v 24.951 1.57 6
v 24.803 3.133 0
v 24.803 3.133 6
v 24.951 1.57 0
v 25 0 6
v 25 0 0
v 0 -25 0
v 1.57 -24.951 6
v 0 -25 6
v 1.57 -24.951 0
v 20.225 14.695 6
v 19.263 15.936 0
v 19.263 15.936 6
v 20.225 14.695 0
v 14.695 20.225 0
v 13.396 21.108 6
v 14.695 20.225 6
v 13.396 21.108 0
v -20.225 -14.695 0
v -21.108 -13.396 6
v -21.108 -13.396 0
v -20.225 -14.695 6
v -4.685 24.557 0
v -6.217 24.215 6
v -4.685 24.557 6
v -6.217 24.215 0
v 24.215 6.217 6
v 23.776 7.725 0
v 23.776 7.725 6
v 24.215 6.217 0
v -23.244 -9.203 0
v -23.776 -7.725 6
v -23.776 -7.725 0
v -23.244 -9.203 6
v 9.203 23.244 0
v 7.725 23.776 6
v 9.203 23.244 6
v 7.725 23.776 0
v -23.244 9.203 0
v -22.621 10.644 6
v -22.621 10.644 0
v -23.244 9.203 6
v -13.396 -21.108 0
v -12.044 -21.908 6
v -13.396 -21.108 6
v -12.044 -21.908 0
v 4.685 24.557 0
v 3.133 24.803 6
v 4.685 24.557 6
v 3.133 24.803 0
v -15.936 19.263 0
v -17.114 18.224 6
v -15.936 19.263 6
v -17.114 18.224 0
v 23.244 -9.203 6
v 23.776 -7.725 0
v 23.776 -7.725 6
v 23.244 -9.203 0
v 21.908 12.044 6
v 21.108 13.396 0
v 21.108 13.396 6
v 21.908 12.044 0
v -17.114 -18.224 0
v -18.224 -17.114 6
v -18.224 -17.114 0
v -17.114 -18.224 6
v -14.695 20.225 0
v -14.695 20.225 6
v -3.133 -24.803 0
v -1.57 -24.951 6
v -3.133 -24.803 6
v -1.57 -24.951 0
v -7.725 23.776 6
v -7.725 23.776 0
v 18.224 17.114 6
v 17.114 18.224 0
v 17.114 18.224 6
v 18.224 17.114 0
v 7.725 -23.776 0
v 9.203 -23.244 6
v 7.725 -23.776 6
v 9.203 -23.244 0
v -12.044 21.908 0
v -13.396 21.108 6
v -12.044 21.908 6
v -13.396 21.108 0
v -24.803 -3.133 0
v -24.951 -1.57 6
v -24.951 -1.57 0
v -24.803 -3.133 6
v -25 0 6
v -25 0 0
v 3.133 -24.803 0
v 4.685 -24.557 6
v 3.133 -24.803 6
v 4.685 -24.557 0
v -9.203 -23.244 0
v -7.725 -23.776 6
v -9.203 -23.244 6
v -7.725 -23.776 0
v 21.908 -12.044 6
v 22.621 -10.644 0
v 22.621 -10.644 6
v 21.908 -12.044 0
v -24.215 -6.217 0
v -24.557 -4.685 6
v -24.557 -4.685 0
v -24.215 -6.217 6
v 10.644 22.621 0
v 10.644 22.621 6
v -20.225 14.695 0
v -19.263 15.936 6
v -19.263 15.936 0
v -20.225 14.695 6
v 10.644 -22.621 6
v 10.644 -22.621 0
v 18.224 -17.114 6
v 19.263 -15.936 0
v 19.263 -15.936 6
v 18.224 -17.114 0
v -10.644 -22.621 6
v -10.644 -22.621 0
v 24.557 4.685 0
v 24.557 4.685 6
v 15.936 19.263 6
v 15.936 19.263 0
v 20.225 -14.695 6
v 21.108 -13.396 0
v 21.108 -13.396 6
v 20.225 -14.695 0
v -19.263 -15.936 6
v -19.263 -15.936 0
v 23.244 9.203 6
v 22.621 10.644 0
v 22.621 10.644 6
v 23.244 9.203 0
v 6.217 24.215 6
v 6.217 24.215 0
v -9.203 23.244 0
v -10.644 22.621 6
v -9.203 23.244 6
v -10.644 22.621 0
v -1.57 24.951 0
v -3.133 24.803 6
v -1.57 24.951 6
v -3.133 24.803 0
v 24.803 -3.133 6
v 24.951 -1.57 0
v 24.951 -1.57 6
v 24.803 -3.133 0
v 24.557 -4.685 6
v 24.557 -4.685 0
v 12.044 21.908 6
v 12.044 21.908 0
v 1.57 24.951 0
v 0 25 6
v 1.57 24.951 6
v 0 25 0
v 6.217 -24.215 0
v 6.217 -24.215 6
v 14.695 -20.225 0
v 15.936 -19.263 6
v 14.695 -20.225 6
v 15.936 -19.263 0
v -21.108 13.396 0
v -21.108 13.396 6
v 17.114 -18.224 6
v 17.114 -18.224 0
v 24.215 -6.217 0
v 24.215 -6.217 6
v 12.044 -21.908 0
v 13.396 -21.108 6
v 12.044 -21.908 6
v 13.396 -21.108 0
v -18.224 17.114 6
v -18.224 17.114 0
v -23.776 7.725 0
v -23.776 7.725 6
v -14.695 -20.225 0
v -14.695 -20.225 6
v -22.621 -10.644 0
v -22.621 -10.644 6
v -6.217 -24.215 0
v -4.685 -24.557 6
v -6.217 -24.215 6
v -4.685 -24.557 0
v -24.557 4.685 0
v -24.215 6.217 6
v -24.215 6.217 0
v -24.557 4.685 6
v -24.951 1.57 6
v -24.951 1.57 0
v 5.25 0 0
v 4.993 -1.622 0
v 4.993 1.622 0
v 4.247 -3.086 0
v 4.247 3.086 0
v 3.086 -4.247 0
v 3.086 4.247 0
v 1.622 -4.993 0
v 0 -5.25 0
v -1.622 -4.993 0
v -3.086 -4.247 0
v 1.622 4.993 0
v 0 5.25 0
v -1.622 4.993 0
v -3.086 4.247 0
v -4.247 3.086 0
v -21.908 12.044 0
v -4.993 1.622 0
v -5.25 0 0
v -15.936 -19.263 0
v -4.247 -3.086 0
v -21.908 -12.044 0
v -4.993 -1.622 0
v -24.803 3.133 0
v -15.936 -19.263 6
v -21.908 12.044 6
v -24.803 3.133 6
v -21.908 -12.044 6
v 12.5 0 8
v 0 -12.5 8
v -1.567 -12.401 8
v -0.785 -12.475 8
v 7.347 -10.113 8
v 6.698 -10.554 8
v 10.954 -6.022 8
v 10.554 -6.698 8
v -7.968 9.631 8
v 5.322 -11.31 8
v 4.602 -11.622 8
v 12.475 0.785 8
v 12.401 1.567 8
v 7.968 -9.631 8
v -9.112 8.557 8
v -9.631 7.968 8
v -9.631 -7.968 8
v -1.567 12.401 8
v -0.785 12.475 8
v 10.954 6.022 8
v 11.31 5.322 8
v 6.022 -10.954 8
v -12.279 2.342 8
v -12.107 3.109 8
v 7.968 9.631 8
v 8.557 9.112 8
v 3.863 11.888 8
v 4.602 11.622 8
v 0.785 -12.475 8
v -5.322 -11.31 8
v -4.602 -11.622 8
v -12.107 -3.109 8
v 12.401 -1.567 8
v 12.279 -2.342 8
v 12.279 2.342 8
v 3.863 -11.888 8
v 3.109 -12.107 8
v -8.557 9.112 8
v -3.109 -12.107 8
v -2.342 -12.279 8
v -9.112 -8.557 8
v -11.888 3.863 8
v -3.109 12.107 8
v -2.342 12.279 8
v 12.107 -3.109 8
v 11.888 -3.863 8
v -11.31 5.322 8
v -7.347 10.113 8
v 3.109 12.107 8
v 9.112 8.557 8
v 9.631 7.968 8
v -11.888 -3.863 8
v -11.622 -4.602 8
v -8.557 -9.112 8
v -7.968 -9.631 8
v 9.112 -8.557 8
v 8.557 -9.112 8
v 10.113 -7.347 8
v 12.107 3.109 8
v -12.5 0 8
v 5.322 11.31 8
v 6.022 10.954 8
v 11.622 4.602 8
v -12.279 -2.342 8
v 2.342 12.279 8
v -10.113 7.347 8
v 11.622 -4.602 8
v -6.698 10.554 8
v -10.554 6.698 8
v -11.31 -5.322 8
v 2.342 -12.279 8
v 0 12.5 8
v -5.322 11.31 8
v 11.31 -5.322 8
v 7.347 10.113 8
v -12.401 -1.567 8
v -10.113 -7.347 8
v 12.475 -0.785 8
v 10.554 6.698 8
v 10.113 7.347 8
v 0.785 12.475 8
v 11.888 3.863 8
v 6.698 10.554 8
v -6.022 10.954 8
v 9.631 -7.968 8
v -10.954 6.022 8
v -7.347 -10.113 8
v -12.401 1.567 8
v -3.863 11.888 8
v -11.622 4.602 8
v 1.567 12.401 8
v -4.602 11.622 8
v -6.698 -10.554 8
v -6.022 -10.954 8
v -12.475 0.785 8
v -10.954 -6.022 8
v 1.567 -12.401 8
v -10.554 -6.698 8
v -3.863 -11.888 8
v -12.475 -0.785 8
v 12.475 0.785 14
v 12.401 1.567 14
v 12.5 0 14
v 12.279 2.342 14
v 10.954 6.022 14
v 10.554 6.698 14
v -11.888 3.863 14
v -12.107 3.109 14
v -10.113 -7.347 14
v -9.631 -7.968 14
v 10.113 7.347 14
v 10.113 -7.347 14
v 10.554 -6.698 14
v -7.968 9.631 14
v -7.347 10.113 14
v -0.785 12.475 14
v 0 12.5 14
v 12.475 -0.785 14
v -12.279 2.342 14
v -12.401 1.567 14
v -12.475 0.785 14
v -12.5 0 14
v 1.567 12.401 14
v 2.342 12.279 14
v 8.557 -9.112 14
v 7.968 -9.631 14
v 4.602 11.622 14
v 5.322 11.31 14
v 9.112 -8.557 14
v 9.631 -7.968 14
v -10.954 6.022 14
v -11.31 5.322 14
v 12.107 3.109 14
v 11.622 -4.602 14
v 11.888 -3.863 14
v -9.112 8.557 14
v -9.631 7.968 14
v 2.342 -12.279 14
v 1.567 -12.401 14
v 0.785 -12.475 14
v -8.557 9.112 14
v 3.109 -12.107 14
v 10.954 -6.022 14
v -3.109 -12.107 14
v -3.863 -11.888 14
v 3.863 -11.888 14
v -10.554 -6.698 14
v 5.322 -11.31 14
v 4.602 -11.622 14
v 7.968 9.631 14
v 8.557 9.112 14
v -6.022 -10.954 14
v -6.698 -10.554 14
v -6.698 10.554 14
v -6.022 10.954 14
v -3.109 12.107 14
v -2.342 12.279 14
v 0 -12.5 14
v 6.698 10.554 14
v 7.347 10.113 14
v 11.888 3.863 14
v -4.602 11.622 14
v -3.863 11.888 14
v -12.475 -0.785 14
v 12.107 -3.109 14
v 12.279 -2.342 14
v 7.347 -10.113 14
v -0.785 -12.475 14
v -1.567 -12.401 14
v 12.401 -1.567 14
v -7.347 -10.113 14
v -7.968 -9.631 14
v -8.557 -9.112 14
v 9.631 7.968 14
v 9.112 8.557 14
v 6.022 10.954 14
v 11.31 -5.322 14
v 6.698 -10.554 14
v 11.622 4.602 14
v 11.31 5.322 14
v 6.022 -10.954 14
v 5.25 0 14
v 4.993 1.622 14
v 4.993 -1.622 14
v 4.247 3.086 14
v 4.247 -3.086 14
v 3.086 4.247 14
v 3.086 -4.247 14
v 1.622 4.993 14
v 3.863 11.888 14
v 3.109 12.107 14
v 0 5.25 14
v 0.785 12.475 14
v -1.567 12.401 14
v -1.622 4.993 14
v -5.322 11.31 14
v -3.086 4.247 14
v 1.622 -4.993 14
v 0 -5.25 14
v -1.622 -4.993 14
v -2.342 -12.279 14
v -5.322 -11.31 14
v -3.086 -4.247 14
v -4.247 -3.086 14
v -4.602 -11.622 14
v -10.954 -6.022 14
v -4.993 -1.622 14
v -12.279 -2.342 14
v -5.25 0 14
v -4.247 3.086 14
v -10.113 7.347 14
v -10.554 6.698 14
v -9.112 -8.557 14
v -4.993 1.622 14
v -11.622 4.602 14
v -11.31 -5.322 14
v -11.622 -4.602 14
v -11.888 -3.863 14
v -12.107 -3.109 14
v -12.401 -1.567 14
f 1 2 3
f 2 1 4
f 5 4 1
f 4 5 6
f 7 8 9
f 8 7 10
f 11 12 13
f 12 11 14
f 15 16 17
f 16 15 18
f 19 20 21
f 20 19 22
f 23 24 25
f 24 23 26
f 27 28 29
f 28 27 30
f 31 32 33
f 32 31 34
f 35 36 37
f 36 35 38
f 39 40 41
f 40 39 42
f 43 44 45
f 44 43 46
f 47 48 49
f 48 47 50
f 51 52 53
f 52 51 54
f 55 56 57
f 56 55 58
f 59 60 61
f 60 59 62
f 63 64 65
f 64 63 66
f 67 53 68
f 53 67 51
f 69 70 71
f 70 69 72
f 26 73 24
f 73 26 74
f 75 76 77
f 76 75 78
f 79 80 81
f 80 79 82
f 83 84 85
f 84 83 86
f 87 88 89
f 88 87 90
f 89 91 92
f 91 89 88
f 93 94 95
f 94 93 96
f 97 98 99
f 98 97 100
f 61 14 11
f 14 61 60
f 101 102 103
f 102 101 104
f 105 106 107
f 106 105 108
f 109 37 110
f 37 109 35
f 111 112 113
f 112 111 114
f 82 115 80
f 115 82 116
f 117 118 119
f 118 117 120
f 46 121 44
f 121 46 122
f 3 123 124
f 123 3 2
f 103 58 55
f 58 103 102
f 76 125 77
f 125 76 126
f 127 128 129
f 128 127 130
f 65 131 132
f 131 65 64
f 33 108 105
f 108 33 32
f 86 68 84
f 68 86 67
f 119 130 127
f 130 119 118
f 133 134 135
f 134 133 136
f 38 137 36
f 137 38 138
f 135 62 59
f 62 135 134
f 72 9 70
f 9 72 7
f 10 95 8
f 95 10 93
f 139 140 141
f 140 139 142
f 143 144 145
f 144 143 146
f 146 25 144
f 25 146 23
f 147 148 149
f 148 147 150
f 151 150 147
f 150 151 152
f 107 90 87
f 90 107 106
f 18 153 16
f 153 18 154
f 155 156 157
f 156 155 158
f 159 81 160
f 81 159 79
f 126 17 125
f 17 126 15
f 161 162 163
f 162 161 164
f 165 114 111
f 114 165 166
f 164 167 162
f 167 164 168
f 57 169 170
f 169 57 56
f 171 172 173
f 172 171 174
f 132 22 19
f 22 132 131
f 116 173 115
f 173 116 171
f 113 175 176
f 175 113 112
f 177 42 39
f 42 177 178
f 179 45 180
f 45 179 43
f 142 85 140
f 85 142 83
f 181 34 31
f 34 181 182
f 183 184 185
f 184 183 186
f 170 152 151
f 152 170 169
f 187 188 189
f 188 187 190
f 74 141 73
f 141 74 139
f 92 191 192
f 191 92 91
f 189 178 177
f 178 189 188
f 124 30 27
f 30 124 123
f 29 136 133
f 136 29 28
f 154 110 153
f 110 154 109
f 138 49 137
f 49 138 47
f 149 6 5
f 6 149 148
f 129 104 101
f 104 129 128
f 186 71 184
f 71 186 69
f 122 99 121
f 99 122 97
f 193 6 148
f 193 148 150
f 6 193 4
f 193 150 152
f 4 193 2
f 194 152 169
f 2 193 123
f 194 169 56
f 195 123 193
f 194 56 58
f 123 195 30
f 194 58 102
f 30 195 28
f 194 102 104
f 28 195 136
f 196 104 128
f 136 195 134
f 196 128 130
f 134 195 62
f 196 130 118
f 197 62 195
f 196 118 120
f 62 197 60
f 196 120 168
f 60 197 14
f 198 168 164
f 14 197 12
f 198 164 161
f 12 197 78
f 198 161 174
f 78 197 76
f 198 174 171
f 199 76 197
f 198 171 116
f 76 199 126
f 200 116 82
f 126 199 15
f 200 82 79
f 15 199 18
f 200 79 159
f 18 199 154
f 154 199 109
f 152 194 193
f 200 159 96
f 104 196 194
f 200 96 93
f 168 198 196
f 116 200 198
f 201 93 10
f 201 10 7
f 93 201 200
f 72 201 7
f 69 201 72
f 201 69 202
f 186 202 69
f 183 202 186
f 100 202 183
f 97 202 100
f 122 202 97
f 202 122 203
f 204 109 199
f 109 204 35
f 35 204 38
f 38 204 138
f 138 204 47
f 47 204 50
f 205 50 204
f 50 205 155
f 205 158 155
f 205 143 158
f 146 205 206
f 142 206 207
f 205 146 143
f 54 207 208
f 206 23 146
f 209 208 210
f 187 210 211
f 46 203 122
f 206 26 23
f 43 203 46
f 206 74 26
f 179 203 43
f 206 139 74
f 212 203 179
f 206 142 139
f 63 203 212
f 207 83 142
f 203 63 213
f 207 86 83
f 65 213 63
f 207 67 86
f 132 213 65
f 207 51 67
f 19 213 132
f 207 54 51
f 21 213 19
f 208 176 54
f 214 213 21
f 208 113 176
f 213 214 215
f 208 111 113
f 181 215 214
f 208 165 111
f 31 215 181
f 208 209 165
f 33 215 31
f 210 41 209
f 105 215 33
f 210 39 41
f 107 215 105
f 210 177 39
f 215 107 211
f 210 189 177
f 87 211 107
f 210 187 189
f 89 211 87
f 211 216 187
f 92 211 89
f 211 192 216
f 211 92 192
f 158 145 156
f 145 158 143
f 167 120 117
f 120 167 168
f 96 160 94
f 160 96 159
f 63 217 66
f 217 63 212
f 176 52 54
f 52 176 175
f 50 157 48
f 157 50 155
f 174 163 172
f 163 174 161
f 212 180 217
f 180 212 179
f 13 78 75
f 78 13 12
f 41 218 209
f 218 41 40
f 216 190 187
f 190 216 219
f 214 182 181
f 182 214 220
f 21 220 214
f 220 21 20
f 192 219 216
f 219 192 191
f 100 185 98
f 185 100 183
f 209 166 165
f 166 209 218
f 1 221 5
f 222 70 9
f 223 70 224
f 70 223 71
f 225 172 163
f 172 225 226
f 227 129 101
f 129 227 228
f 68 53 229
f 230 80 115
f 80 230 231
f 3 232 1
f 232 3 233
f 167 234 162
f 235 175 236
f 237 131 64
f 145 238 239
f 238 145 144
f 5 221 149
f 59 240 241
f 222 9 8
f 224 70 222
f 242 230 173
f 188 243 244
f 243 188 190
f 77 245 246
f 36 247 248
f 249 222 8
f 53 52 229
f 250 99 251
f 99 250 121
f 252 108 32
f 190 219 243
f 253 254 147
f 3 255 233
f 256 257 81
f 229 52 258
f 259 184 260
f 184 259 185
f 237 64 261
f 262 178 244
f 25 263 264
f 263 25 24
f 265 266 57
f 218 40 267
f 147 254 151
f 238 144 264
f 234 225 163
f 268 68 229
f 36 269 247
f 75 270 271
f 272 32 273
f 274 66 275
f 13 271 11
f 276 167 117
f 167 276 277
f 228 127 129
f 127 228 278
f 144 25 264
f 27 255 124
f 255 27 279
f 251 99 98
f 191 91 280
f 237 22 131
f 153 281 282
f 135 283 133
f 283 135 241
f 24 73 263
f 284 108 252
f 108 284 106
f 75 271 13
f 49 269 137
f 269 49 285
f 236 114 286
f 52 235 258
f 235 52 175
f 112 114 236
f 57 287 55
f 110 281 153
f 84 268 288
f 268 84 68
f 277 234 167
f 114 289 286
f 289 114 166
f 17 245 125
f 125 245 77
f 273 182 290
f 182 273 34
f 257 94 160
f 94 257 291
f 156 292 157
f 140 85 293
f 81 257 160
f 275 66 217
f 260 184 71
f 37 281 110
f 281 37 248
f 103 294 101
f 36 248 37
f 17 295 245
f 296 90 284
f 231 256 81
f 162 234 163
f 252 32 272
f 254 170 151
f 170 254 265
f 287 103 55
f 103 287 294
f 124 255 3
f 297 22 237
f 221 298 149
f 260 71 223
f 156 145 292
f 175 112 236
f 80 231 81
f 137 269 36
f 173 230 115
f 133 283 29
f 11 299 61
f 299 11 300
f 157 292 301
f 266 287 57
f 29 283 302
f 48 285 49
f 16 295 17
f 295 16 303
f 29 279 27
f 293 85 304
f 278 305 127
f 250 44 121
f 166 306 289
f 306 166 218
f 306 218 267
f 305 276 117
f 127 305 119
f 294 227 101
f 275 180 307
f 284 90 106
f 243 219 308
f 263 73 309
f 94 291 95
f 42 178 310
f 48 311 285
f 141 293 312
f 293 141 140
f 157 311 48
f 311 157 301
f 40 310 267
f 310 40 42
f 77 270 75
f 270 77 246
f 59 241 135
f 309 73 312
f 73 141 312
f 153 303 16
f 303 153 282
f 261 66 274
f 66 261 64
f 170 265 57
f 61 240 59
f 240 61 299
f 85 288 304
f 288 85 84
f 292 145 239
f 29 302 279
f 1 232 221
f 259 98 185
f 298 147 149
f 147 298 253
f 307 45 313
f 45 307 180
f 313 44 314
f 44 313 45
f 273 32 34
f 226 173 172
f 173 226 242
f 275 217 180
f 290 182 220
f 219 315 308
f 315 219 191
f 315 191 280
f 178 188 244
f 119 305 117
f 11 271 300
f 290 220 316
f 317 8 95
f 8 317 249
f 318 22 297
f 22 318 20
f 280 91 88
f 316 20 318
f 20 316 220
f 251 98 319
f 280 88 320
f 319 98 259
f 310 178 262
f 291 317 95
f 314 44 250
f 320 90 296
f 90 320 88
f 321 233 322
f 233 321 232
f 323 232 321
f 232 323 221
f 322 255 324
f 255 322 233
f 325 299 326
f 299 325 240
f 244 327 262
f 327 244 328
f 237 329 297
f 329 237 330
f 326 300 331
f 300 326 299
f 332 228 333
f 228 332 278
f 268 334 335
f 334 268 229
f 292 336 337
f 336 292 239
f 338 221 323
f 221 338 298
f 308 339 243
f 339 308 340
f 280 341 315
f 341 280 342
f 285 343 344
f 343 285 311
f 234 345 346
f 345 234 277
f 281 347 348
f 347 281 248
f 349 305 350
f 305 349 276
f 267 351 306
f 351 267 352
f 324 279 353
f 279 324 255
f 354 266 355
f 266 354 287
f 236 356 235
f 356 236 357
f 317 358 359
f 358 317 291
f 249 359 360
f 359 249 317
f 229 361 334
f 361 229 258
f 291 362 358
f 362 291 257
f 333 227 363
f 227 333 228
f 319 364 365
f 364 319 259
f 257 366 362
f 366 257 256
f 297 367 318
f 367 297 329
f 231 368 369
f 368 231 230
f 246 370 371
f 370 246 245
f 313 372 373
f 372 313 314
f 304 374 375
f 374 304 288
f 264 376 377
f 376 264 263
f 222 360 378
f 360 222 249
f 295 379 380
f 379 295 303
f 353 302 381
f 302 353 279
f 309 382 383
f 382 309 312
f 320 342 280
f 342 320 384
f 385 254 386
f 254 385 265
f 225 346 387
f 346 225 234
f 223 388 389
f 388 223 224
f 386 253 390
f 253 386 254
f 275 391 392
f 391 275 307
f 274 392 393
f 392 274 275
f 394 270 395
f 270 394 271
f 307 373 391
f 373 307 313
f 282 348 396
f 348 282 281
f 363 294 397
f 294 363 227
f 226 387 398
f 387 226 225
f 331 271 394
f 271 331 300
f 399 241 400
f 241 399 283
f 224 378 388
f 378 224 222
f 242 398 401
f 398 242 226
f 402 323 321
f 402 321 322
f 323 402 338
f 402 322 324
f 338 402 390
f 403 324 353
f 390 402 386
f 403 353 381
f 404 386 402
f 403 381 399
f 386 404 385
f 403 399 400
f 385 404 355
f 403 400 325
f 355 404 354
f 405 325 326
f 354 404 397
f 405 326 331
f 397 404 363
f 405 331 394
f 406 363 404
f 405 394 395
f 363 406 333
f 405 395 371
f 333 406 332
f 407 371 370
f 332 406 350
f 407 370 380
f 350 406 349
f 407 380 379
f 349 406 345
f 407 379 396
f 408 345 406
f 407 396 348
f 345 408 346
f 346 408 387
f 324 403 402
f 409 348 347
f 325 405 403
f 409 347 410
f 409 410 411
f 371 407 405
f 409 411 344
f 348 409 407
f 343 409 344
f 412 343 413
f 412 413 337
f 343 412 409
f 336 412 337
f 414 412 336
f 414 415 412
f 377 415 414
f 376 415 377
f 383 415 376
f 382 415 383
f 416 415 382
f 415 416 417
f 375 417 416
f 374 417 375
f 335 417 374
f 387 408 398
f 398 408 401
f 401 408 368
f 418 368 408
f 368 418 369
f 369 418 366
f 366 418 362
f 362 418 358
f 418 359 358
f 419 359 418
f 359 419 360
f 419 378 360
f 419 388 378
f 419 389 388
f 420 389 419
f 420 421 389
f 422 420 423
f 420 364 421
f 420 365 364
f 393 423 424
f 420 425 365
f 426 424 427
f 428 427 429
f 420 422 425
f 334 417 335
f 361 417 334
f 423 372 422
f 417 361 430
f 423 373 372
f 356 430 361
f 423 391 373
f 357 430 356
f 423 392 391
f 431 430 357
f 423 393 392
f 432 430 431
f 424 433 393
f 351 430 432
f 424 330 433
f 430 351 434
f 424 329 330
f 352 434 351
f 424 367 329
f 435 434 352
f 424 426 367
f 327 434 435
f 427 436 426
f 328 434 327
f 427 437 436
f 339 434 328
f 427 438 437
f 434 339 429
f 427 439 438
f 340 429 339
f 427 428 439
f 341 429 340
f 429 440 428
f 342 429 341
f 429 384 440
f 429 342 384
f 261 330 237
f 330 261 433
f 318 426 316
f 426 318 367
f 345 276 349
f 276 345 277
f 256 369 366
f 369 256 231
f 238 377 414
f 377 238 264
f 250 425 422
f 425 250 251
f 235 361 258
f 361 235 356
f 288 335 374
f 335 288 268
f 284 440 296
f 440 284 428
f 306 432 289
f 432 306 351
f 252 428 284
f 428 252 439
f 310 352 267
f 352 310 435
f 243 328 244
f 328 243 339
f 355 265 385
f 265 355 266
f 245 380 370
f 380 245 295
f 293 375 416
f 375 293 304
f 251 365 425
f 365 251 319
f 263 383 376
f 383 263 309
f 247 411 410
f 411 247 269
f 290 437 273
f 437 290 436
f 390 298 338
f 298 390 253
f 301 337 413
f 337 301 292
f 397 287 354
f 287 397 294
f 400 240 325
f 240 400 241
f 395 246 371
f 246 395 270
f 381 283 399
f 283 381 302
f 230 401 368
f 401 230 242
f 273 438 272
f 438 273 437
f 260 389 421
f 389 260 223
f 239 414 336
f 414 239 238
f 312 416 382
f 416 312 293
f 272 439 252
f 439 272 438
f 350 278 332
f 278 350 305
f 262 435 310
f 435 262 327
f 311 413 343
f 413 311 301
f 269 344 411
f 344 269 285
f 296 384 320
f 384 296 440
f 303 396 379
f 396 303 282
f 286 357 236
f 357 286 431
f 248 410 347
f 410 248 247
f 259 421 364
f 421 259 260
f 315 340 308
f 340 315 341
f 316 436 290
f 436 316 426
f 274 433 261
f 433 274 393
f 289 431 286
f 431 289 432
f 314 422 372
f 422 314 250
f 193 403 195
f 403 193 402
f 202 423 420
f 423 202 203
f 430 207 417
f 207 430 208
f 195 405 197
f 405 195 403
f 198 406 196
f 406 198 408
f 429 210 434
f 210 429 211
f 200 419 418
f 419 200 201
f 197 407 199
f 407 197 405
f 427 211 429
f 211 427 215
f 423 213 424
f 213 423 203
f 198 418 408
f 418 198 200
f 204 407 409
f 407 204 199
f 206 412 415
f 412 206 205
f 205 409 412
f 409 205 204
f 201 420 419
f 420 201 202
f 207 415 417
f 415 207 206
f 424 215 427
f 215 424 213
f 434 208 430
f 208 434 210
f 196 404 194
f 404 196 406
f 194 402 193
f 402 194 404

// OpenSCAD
//RUEDA con radios 
//parametros rueda

//medidas del aro externo de la rueda.
diametro=50; //diametro externo de la rueda. influye en la velocidad.
grosor=6;	// grosor del aro externo de la rueda
altura_hub=8;
altura_bisel=2;

//medidas de los radios
//grosor_radios=8; //grosor o altura de los radios

//medidas del hub central
//diam_eje=4;  //eje central por el que pasa el tornillo de izquierdas



//medidas de los agujeros del hub
metrica_hub=3;

module rueda(gros=grosor, diam=diametro)
{
	difference(){
		
				
				union(){
					cylinder (r=diam/2, h=gros, $fn=100);
					translate([0,0,grosor])
					cylinder (r1=diam/2,r2=25/2, h=altura_bisel, $fn=100);
					translate([0,0,grosor])
					cylinder (r=25/2, h=altura_hub, $fn=100);
					
				}
				cylinder (r=10.5/2, h=100, $fn=20, center=true);
				//translate([8,0,0])
				//cylinder (r=3.5/2, h=100, $fn=20, center=true);
				//translate([-8,0,0])
				//cylinder (r=3.5/2, h=100, $fn=20, center=true);
			
	}//fin diference
}




	
	rueda();
	
	

	




	
